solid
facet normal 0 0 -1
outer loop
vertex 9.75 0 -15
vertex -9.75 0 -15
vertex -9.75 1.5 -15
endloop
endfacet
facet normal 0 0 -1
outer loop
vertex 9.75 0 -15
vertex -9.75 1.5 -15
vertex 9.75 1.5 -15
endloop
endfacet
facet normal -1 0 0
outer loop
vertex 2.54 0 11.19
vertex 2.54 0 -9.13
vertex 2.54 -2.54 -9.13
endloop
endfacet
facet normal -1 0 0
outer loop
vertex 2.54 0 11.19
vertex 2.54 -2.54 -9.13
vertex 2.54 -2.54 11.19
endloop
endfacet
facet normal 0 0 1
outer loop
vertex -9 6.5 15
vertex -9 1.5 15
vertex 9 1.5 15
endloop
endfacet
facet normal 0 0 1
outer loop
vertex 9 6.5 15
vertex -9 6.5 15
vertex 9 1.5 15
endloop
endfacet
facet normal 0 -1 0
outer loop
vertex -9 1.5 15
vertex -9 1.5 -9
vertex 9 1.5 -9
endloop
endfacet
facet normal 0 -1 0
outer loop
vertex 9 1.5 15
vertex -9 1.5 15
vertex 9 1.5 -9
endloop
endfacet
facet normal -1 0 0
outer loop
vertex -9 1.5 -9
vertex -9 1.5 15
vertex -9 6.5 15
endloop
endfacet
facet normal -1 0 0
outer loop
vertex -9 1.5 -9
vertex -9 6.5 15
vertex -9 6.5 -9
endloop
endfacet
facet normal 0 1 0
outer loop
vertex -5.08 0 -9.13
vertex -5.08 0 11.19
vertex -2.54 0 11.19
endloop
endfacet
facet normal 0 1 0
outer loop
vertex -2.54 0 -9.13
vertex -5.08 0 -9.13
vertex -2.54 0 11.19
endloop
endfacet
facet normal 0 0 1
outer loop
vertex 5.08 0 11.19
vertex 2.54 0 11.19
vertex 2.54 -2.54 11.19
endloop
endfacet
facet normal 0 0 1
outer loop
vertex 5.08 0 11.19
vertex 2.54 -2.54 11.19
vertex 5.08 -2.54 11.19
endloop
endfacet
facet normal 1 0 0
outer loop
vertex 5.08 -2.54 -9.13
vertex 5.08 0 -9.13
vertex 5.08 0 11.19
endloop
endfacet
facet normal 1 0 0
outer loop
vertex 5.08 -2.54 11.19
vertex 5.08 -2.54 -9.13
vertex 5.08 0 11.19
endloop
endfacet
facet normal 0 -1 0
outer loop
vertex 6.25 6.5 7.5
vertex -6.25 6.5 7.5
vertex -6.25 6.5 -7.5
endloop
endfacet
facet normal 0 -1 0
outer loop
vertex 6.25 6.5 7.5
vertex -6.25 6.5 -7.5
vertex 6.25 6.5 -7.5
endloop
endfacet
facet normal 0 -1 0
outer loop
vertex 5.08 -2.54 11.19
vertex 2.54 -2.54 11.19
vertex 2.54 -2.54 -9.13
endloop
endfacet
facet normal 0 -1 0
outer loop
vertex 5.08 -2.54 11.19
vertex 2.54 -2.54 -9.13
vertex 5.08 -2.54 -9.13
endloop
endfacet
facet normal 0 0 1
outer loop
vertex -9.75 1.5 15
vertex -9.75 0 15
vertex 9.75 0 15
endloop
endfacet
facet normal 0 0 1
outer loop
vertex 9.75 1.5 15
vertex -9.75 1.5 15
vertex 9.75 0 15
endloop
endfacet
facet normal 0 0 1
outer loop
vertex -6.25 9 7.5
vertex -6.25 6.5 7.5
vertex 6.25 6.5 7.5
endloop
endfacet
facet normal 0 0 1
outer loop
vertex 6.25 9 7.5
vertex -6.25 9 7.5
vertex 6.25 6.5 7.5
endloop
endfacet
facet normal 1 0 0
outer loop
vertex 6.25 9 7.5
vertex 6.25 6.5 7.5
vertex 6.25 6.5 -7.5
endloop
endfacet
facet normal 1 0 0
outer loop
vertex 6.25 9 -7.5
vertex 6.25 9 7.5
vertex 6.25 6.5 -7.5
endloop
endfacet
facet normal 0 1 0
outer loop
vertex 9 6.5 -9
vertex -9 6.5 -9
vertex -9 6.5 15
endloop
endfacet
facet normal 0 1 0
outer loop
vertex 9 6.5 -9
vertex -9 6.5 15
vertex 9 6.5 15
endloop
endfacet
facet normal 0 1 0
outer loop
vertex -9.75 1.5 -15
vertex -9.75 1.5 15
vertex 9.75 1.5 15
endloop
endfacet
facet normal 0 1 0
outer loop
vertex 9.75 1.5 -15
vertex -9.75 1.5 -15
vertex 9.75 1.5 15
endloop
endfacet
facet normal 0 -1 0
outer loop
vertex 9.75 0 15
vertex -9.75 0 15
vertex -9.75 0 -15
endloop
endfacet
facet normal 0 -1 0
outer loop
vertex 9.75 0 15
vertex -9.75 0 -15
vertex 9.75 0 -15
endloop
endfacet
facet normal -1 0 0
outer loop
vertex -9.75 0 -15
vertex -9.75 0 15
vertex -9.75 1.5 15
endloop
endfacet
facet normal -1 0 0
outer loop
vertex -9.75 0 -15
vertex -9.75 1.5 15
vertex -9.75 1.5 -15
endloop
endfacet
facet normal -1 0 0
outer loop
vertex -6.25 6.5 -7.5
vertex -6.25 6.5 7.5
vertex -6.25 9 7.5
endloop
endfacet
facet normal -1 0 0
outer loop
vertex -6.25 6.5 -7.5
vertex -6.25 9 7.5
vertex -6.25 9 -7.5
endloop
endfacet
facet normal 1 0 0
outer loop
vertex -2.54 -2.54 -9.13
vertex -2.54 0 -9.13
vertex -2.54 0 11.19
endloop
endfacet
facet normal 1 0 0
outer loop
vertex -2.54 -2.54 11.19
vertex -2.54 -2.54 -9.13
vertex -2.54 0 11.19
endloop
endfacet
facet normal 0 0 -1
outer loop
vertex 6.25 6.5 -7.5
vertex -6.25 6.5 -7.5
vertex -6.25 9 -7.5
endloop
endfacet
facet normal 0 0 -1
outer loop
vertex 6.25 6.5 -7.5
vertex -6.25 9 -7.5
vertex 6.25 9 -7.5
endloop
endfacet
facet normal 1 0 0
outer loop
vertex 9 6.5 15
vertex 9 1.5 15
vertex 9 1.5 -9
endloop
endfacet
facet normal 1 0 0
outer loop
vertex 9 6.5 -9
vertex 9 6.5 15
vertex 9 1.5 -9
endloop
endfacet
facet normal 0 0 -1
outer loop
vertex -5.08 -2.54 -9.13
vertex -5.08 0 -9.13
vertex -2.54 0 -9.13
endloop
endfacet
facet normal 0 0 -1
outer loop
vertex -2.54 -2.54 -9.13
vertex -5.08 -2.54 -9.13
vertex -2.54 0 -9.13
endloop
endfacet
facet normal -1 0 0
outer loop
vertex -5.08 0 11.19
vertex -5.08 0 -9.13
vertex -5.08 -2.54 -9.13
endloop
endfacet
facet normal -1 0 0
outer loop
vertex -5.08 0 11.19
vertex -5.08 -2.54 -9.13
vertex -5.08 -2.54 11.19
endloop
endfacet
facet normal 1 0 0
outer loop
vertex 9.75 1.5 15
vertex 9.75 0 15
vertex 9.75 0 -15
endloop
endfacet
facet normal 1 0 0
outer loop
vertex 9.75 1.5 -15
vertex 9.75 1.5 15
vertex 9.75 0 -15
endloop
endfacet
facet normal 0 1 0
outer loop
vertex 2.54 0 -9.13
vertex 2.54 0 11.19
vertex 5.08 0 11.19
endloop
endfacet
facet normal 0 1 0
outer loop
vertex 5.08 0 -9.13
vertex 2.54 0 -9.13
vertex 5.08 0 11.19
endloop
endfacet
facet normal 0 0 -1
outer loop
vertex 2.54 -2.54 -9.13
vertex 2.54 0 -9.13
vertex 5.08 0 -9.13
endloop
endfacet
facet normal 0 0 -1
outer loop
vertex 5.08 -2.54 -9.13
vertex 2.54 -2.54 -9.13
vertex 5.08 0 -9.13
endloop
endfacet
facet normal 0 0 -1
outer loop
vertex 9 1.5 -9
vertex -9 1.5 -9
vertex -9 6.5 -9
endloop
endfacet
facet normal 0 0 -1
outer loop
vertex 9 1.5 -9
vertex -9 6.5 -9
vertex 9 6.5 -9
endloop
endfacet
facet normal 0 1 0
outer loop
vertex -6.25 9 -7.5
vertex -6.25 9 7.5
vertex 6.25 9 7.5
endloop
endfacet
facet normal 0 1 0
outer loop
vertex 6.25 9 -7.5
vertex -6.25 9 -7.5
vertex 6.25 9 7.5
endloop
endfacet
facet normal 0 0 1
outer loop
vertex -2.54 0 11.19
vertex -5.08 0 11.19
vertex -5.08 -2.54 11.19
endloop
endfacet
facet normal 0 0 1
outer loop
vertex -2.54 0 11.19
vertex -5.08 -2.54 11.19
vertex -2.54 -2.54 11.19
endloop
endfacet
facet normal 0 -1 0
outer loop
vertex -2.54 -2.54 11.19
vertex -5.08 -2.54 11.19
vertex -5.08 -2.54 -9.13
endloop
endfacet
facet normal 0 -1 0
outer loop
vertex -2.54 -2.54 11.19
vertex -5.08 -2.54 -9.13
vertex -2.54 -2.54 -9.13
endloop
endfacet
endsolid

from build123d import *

# Parameters (mm, degrees)
SKETCH_1_W        = 19.5
SKETCH_1_H        = 30
EXTRUDE_1_DEPTH   = 1.5
SKETCH_2_W        = 2.54
SKETCH_2_H        = 20.32
EXTRUDE_2_DEPTH   = 2.54
EXTRUDE_2_2_DEPTH = 2.54
SKETCH_3_W        = 18
SKETCH_3_H        = 24
EXTRUDE_3_DEPTH   = 5
SKETCH_4_W        = 12.5
SKETCH_4_H        = 15
EXTRUDE_4_DEPTH   = 2.5


with BuildPart() as part:
    # Эскиз1 → Бобышка-Вытянуть1 (new body)
    with BuildSketch(Plane(origin=(0, 0, 0), x_dir=(1, 0, 0), z_dir=(0, 1, 0))):
        Rectangle(SKETCH_1_W, SKETCH_1_H)
    extrude(amount=EXTRUDE_1_DEPTH)


with BuildPart() as body_2:
    # Эскиз2 → Бобышка-Вытянуть2 (new body)
    with BuildSketch(Plane.XZ):
        with Locations((-3.81, 1.03)):
            Rectangle(SKETCH_2_W, SKETCH_2_H)
    extrude(amount=EXTRUDE_2_DEPTH)


with BuildPart() as body_3:
    # Эскиз2 → Extrude 2 2 (new body)
    with BuildSketch(Plane.XZ):
        with Locations((3.81, 1.03)):
            Rectangle(SKETCH_2_W, SKETCH_2_H)
    extrude(amount=EXTRUDE_2_2_DEPTH)


with BuildPart() as body_4:
    # Эскиз3 → Бобышка-Вытянуть3 (new body)
    with BuildSketch(Plane(origin=(0, 1.5, 0), x_dir=(1, 0, 0), z_dir=(0, 1, 0))):
        with Locations((0, -3)):
            Rectangle(SKETCH_3_W, SKETCH_3_H)
    extrude(amount=EXTRUDE_3_DEPTH)


with BuildPart() as body_5:
    # Эскиз4 → Бобышка-Вытянуть4 (new body)
    with BuildSketch(Plane(origin=(0, 6.5, 0), x_dir=(1, 0, 0), z_dir=(0, 1, 0))):
        Rectangle(SKETCH_4_W, SKETCH_4_H)
    extrude(amount=EXTRUDE_4_DEPTH)


solid = Compound([part.part, body_2.part, body_3.part, body_4.part, body_5.part])
